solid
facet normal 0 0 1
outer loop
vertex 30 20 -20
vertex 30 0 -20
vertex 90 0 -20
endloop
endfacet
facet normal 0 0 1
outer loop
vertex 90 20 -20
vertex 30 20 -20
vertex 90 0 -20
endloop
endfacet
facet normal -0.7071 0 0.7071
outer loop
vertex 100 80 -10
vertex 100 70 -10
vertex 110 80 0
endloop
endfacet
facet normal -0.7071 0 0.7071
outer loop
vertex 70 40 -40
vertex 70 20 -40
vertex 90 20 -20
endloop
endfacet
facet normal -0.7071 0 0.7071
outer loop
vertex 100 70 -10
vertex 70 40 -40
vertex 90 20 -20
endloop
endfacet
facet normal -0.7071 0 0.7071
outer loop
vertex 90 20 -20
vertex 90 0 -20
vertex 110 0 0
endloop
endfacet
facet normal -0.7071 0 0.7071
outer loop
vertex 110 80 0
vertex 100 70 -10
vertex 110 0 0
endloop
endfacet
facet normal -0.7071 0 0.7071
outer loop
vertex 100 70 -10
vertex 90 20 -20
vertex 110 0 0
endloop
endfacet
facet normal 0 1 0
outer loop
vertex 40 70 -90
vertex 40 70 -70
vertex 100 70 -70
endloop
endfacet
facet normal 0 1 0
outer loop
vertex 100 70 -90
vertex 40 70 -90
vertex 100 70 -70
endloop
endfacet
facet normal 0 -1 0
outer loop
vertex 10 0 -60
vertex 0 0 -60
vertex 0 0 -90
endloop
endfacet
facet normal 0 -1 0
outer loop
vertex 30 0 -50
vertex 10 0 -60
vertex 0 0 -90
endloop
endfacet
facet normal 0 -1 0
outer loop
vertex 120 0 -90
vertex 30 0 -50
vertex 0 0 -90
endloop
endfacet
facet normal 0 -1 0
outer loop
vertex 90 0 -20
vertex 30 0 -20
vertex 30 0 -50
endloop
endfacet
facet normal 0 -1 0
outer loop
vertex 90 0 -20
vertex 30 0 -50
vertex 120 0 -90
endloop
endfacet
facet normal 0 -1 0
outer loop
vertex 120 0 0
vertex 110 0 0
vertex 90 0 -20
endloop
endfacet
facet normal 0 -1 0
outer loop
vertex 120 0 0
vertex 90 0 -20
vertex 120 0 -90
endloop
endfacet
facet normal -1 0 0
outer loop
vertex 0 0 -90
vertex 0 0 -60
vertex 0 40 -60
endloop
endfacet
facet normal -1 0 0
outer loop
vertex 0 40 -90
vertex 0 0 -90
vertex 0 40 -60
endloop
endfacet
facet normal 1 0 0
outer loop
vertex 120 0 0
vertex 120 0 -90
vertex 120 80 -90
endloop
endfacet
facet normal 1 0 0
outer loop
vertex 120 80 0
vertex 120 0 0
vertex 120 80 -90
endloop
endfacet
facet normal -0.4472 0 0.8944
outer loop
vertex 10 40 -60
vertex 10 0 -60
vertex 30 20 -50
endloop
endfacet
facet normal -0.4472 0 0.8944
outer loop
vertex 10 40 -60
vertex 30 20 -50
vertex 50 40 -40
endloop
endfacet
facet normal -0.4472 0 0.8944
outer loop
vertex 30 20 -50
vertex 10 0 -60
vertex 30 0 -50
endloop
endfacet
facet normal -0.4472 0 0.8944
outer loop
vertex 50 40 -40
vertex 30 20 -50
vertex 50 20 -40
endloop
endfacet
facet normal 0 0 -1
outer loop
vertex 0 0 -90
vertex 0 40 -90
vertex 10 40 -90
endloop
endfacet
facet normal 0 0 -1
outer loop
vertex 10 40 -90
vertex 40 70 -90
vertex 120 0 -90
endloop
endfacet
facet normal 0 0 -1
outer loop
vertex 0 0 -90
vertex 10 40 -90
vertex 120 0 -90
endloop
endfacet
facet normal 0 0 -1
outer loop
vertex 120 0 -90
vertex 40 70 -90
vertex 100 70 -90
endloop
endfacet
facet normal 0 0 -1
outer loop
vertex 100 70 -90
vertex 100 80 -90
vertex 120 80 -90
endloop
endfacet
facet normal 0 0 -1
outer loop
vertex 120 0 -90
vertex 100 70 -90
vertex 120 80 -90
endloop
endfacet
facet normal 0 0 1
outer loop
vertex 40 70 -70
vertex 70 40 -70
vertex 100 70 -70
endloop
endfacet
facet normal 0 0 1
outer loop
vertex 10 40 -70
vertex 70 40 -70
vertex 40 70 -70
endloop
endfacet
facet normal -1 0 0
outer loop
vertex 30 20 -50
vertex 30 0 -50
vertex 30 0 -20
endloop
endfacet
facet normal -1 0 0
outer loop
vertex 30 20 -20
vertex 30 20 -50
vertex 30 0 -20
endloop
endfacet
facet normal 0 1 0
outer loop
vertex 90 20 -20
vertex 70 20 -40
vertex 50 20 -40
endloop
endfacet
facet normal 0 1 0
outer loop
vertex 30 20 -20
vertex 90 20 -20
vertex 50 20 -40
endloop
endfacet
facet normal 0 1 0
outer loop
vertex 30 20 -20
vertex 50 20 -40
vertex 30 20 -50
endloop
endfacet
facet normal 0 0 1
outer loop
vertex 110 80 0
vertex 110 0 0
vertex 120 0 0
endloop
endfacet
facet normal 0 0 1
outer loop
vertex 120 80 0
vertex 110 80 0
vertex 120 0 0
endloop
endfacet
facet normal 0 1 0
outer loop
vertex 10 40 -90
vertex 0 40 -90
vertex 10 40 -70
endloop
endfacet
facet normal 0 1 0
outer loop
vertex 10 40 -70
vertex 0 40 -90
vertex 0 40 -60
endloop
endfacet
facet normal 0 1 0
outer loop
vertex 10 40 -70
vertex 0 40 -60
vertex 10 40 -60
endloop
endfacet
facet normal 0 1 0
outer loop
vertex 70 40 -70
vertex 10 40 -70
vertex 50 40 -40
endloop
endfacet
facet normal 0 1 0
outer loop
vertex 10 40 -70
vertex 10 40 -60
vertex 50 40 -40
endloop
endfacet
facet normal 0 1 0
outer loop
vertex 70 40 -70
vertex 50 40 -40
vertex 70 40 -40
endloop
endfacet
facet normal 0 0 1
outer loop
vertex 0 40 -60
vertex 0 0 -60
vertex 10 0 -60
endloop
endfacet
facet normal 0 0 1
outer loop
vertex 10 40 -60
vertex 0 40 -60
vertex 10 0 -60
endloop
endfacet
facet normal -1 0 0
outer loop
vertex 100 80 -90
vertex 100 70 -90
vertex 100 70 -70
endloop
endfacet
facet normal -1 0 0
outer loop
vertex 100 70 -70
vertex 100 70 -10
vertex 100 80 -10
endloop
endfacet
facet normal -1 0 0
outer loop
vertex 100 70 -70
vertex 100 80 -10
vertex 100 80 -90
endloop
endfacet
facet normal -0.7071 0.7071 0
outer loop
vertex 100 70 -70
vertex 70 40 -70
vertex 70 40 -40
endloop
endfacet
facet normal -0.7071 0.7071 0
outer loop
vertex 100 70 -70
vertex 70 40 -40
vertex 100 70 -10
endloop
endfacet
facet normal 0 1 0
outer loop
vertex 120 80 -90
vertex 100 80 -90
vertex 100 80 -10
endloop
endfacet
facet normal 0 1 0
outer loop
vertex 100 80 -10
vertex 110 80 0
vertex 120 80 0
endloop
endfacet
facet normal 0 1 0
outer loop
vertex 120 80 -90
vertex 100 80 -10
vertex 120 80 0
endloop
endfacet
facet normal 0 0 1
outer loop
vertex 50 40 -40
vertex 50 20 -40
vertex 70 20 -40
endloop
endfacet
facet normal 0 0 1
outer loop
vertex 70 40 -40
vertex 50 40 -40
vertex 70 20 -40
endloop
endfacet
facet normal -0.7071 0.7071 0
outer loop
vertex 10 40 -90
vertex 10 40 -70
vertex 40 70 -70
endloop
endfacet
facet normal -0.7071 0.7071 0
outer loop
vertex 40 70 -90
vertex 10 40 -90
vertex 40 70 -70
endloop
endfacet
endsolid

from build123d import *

# Parameters (mm, degrees)
SKETCH1_W           = 120
SKETCH1_H           = 80
BOSS_EXTRUDE1_DEPTH = 90
CUT_EXTRUDE1_DEPTH  = 90
CUT_EXTRUDE2_DEPTH  = 90
CUT_EXTRUDE3_DEPTH  = 90
CUT_EXTRUDE4_DEPTH  = 90
CUT_EXTRUDE5_DEPTH  = 90


with BuildPart() as part:
    # Sketch1 → Boss-Extrude1 (new body)
    with BuildSketch(Plane.XY):
        with Locations((60, 40)):
            Rectangle(SKETCH1_W, SKETCH1_H)
    extrude(amount=-BOSS_EXTRUDE1_DEPTH)

    # Sketch2 → Cut-Extrude1 (cut)
    with BuildSketch(Plane.XY):
        Polygon((0, 40), (10, 40), (40, 70), (100, 70), (100, 80), (0, 80), align=None)
    extrude(amount=-CUT_EXTRUDE1_DEPTH, mode=Mode.SUBTRACT)

    # Sketch3 → Cut-Extrude2 (cut)
    with BuildSketch(Plane.XZ):
        Polygon((0, -60), (10, -60), (30, -50), (30, -20), (90, -20), (110, 0), (0, 0), align=None)
    extrude(amount=-CUT_EXTRUDE2_DEPTH, mode=Mode.SUBTRACT)

    # Sketch4 → Cut-Extrude3 (cut)
    with BuildSketch(Plane(origin=(0, 20, 0), x_dir=(1, 0, 0), z_dir=(0, 1, 0))):
        Polygon((30, 20), (30, 50), (50, 40), (70, 40), (90, 20), align=None)
    extrude(amount=CUT_EXTRUDE3_DEPTH, mode=Mode.SUBTRACT)

    # Sketch5 → Cut-Extrude4 (cut)
    with BuildSketch(Plane(origin=(0, 40, 0), x_dir=(1, 0, 0), z_dir=(0, 1, 0))):
        Polygon((70, 40), (70, 70), (10, 70), (10, 60), (50, 40), align=None)
    extrude(amount=CUT_EXTRUDE4_DEPTH, mode=Mode.SUBTRACT)

    # Sketch6 → Cut-Extrude5 (cut)
    with BuildSketch(Plane.XY.offset(-70)):
        Polygon((70, 40), (100, 70), (70, 70), align=None)
    extrude(amount=CUT_EXTRUDE5_DEPTH, mode=Mode.SUBTRACT)


solid = part.part
